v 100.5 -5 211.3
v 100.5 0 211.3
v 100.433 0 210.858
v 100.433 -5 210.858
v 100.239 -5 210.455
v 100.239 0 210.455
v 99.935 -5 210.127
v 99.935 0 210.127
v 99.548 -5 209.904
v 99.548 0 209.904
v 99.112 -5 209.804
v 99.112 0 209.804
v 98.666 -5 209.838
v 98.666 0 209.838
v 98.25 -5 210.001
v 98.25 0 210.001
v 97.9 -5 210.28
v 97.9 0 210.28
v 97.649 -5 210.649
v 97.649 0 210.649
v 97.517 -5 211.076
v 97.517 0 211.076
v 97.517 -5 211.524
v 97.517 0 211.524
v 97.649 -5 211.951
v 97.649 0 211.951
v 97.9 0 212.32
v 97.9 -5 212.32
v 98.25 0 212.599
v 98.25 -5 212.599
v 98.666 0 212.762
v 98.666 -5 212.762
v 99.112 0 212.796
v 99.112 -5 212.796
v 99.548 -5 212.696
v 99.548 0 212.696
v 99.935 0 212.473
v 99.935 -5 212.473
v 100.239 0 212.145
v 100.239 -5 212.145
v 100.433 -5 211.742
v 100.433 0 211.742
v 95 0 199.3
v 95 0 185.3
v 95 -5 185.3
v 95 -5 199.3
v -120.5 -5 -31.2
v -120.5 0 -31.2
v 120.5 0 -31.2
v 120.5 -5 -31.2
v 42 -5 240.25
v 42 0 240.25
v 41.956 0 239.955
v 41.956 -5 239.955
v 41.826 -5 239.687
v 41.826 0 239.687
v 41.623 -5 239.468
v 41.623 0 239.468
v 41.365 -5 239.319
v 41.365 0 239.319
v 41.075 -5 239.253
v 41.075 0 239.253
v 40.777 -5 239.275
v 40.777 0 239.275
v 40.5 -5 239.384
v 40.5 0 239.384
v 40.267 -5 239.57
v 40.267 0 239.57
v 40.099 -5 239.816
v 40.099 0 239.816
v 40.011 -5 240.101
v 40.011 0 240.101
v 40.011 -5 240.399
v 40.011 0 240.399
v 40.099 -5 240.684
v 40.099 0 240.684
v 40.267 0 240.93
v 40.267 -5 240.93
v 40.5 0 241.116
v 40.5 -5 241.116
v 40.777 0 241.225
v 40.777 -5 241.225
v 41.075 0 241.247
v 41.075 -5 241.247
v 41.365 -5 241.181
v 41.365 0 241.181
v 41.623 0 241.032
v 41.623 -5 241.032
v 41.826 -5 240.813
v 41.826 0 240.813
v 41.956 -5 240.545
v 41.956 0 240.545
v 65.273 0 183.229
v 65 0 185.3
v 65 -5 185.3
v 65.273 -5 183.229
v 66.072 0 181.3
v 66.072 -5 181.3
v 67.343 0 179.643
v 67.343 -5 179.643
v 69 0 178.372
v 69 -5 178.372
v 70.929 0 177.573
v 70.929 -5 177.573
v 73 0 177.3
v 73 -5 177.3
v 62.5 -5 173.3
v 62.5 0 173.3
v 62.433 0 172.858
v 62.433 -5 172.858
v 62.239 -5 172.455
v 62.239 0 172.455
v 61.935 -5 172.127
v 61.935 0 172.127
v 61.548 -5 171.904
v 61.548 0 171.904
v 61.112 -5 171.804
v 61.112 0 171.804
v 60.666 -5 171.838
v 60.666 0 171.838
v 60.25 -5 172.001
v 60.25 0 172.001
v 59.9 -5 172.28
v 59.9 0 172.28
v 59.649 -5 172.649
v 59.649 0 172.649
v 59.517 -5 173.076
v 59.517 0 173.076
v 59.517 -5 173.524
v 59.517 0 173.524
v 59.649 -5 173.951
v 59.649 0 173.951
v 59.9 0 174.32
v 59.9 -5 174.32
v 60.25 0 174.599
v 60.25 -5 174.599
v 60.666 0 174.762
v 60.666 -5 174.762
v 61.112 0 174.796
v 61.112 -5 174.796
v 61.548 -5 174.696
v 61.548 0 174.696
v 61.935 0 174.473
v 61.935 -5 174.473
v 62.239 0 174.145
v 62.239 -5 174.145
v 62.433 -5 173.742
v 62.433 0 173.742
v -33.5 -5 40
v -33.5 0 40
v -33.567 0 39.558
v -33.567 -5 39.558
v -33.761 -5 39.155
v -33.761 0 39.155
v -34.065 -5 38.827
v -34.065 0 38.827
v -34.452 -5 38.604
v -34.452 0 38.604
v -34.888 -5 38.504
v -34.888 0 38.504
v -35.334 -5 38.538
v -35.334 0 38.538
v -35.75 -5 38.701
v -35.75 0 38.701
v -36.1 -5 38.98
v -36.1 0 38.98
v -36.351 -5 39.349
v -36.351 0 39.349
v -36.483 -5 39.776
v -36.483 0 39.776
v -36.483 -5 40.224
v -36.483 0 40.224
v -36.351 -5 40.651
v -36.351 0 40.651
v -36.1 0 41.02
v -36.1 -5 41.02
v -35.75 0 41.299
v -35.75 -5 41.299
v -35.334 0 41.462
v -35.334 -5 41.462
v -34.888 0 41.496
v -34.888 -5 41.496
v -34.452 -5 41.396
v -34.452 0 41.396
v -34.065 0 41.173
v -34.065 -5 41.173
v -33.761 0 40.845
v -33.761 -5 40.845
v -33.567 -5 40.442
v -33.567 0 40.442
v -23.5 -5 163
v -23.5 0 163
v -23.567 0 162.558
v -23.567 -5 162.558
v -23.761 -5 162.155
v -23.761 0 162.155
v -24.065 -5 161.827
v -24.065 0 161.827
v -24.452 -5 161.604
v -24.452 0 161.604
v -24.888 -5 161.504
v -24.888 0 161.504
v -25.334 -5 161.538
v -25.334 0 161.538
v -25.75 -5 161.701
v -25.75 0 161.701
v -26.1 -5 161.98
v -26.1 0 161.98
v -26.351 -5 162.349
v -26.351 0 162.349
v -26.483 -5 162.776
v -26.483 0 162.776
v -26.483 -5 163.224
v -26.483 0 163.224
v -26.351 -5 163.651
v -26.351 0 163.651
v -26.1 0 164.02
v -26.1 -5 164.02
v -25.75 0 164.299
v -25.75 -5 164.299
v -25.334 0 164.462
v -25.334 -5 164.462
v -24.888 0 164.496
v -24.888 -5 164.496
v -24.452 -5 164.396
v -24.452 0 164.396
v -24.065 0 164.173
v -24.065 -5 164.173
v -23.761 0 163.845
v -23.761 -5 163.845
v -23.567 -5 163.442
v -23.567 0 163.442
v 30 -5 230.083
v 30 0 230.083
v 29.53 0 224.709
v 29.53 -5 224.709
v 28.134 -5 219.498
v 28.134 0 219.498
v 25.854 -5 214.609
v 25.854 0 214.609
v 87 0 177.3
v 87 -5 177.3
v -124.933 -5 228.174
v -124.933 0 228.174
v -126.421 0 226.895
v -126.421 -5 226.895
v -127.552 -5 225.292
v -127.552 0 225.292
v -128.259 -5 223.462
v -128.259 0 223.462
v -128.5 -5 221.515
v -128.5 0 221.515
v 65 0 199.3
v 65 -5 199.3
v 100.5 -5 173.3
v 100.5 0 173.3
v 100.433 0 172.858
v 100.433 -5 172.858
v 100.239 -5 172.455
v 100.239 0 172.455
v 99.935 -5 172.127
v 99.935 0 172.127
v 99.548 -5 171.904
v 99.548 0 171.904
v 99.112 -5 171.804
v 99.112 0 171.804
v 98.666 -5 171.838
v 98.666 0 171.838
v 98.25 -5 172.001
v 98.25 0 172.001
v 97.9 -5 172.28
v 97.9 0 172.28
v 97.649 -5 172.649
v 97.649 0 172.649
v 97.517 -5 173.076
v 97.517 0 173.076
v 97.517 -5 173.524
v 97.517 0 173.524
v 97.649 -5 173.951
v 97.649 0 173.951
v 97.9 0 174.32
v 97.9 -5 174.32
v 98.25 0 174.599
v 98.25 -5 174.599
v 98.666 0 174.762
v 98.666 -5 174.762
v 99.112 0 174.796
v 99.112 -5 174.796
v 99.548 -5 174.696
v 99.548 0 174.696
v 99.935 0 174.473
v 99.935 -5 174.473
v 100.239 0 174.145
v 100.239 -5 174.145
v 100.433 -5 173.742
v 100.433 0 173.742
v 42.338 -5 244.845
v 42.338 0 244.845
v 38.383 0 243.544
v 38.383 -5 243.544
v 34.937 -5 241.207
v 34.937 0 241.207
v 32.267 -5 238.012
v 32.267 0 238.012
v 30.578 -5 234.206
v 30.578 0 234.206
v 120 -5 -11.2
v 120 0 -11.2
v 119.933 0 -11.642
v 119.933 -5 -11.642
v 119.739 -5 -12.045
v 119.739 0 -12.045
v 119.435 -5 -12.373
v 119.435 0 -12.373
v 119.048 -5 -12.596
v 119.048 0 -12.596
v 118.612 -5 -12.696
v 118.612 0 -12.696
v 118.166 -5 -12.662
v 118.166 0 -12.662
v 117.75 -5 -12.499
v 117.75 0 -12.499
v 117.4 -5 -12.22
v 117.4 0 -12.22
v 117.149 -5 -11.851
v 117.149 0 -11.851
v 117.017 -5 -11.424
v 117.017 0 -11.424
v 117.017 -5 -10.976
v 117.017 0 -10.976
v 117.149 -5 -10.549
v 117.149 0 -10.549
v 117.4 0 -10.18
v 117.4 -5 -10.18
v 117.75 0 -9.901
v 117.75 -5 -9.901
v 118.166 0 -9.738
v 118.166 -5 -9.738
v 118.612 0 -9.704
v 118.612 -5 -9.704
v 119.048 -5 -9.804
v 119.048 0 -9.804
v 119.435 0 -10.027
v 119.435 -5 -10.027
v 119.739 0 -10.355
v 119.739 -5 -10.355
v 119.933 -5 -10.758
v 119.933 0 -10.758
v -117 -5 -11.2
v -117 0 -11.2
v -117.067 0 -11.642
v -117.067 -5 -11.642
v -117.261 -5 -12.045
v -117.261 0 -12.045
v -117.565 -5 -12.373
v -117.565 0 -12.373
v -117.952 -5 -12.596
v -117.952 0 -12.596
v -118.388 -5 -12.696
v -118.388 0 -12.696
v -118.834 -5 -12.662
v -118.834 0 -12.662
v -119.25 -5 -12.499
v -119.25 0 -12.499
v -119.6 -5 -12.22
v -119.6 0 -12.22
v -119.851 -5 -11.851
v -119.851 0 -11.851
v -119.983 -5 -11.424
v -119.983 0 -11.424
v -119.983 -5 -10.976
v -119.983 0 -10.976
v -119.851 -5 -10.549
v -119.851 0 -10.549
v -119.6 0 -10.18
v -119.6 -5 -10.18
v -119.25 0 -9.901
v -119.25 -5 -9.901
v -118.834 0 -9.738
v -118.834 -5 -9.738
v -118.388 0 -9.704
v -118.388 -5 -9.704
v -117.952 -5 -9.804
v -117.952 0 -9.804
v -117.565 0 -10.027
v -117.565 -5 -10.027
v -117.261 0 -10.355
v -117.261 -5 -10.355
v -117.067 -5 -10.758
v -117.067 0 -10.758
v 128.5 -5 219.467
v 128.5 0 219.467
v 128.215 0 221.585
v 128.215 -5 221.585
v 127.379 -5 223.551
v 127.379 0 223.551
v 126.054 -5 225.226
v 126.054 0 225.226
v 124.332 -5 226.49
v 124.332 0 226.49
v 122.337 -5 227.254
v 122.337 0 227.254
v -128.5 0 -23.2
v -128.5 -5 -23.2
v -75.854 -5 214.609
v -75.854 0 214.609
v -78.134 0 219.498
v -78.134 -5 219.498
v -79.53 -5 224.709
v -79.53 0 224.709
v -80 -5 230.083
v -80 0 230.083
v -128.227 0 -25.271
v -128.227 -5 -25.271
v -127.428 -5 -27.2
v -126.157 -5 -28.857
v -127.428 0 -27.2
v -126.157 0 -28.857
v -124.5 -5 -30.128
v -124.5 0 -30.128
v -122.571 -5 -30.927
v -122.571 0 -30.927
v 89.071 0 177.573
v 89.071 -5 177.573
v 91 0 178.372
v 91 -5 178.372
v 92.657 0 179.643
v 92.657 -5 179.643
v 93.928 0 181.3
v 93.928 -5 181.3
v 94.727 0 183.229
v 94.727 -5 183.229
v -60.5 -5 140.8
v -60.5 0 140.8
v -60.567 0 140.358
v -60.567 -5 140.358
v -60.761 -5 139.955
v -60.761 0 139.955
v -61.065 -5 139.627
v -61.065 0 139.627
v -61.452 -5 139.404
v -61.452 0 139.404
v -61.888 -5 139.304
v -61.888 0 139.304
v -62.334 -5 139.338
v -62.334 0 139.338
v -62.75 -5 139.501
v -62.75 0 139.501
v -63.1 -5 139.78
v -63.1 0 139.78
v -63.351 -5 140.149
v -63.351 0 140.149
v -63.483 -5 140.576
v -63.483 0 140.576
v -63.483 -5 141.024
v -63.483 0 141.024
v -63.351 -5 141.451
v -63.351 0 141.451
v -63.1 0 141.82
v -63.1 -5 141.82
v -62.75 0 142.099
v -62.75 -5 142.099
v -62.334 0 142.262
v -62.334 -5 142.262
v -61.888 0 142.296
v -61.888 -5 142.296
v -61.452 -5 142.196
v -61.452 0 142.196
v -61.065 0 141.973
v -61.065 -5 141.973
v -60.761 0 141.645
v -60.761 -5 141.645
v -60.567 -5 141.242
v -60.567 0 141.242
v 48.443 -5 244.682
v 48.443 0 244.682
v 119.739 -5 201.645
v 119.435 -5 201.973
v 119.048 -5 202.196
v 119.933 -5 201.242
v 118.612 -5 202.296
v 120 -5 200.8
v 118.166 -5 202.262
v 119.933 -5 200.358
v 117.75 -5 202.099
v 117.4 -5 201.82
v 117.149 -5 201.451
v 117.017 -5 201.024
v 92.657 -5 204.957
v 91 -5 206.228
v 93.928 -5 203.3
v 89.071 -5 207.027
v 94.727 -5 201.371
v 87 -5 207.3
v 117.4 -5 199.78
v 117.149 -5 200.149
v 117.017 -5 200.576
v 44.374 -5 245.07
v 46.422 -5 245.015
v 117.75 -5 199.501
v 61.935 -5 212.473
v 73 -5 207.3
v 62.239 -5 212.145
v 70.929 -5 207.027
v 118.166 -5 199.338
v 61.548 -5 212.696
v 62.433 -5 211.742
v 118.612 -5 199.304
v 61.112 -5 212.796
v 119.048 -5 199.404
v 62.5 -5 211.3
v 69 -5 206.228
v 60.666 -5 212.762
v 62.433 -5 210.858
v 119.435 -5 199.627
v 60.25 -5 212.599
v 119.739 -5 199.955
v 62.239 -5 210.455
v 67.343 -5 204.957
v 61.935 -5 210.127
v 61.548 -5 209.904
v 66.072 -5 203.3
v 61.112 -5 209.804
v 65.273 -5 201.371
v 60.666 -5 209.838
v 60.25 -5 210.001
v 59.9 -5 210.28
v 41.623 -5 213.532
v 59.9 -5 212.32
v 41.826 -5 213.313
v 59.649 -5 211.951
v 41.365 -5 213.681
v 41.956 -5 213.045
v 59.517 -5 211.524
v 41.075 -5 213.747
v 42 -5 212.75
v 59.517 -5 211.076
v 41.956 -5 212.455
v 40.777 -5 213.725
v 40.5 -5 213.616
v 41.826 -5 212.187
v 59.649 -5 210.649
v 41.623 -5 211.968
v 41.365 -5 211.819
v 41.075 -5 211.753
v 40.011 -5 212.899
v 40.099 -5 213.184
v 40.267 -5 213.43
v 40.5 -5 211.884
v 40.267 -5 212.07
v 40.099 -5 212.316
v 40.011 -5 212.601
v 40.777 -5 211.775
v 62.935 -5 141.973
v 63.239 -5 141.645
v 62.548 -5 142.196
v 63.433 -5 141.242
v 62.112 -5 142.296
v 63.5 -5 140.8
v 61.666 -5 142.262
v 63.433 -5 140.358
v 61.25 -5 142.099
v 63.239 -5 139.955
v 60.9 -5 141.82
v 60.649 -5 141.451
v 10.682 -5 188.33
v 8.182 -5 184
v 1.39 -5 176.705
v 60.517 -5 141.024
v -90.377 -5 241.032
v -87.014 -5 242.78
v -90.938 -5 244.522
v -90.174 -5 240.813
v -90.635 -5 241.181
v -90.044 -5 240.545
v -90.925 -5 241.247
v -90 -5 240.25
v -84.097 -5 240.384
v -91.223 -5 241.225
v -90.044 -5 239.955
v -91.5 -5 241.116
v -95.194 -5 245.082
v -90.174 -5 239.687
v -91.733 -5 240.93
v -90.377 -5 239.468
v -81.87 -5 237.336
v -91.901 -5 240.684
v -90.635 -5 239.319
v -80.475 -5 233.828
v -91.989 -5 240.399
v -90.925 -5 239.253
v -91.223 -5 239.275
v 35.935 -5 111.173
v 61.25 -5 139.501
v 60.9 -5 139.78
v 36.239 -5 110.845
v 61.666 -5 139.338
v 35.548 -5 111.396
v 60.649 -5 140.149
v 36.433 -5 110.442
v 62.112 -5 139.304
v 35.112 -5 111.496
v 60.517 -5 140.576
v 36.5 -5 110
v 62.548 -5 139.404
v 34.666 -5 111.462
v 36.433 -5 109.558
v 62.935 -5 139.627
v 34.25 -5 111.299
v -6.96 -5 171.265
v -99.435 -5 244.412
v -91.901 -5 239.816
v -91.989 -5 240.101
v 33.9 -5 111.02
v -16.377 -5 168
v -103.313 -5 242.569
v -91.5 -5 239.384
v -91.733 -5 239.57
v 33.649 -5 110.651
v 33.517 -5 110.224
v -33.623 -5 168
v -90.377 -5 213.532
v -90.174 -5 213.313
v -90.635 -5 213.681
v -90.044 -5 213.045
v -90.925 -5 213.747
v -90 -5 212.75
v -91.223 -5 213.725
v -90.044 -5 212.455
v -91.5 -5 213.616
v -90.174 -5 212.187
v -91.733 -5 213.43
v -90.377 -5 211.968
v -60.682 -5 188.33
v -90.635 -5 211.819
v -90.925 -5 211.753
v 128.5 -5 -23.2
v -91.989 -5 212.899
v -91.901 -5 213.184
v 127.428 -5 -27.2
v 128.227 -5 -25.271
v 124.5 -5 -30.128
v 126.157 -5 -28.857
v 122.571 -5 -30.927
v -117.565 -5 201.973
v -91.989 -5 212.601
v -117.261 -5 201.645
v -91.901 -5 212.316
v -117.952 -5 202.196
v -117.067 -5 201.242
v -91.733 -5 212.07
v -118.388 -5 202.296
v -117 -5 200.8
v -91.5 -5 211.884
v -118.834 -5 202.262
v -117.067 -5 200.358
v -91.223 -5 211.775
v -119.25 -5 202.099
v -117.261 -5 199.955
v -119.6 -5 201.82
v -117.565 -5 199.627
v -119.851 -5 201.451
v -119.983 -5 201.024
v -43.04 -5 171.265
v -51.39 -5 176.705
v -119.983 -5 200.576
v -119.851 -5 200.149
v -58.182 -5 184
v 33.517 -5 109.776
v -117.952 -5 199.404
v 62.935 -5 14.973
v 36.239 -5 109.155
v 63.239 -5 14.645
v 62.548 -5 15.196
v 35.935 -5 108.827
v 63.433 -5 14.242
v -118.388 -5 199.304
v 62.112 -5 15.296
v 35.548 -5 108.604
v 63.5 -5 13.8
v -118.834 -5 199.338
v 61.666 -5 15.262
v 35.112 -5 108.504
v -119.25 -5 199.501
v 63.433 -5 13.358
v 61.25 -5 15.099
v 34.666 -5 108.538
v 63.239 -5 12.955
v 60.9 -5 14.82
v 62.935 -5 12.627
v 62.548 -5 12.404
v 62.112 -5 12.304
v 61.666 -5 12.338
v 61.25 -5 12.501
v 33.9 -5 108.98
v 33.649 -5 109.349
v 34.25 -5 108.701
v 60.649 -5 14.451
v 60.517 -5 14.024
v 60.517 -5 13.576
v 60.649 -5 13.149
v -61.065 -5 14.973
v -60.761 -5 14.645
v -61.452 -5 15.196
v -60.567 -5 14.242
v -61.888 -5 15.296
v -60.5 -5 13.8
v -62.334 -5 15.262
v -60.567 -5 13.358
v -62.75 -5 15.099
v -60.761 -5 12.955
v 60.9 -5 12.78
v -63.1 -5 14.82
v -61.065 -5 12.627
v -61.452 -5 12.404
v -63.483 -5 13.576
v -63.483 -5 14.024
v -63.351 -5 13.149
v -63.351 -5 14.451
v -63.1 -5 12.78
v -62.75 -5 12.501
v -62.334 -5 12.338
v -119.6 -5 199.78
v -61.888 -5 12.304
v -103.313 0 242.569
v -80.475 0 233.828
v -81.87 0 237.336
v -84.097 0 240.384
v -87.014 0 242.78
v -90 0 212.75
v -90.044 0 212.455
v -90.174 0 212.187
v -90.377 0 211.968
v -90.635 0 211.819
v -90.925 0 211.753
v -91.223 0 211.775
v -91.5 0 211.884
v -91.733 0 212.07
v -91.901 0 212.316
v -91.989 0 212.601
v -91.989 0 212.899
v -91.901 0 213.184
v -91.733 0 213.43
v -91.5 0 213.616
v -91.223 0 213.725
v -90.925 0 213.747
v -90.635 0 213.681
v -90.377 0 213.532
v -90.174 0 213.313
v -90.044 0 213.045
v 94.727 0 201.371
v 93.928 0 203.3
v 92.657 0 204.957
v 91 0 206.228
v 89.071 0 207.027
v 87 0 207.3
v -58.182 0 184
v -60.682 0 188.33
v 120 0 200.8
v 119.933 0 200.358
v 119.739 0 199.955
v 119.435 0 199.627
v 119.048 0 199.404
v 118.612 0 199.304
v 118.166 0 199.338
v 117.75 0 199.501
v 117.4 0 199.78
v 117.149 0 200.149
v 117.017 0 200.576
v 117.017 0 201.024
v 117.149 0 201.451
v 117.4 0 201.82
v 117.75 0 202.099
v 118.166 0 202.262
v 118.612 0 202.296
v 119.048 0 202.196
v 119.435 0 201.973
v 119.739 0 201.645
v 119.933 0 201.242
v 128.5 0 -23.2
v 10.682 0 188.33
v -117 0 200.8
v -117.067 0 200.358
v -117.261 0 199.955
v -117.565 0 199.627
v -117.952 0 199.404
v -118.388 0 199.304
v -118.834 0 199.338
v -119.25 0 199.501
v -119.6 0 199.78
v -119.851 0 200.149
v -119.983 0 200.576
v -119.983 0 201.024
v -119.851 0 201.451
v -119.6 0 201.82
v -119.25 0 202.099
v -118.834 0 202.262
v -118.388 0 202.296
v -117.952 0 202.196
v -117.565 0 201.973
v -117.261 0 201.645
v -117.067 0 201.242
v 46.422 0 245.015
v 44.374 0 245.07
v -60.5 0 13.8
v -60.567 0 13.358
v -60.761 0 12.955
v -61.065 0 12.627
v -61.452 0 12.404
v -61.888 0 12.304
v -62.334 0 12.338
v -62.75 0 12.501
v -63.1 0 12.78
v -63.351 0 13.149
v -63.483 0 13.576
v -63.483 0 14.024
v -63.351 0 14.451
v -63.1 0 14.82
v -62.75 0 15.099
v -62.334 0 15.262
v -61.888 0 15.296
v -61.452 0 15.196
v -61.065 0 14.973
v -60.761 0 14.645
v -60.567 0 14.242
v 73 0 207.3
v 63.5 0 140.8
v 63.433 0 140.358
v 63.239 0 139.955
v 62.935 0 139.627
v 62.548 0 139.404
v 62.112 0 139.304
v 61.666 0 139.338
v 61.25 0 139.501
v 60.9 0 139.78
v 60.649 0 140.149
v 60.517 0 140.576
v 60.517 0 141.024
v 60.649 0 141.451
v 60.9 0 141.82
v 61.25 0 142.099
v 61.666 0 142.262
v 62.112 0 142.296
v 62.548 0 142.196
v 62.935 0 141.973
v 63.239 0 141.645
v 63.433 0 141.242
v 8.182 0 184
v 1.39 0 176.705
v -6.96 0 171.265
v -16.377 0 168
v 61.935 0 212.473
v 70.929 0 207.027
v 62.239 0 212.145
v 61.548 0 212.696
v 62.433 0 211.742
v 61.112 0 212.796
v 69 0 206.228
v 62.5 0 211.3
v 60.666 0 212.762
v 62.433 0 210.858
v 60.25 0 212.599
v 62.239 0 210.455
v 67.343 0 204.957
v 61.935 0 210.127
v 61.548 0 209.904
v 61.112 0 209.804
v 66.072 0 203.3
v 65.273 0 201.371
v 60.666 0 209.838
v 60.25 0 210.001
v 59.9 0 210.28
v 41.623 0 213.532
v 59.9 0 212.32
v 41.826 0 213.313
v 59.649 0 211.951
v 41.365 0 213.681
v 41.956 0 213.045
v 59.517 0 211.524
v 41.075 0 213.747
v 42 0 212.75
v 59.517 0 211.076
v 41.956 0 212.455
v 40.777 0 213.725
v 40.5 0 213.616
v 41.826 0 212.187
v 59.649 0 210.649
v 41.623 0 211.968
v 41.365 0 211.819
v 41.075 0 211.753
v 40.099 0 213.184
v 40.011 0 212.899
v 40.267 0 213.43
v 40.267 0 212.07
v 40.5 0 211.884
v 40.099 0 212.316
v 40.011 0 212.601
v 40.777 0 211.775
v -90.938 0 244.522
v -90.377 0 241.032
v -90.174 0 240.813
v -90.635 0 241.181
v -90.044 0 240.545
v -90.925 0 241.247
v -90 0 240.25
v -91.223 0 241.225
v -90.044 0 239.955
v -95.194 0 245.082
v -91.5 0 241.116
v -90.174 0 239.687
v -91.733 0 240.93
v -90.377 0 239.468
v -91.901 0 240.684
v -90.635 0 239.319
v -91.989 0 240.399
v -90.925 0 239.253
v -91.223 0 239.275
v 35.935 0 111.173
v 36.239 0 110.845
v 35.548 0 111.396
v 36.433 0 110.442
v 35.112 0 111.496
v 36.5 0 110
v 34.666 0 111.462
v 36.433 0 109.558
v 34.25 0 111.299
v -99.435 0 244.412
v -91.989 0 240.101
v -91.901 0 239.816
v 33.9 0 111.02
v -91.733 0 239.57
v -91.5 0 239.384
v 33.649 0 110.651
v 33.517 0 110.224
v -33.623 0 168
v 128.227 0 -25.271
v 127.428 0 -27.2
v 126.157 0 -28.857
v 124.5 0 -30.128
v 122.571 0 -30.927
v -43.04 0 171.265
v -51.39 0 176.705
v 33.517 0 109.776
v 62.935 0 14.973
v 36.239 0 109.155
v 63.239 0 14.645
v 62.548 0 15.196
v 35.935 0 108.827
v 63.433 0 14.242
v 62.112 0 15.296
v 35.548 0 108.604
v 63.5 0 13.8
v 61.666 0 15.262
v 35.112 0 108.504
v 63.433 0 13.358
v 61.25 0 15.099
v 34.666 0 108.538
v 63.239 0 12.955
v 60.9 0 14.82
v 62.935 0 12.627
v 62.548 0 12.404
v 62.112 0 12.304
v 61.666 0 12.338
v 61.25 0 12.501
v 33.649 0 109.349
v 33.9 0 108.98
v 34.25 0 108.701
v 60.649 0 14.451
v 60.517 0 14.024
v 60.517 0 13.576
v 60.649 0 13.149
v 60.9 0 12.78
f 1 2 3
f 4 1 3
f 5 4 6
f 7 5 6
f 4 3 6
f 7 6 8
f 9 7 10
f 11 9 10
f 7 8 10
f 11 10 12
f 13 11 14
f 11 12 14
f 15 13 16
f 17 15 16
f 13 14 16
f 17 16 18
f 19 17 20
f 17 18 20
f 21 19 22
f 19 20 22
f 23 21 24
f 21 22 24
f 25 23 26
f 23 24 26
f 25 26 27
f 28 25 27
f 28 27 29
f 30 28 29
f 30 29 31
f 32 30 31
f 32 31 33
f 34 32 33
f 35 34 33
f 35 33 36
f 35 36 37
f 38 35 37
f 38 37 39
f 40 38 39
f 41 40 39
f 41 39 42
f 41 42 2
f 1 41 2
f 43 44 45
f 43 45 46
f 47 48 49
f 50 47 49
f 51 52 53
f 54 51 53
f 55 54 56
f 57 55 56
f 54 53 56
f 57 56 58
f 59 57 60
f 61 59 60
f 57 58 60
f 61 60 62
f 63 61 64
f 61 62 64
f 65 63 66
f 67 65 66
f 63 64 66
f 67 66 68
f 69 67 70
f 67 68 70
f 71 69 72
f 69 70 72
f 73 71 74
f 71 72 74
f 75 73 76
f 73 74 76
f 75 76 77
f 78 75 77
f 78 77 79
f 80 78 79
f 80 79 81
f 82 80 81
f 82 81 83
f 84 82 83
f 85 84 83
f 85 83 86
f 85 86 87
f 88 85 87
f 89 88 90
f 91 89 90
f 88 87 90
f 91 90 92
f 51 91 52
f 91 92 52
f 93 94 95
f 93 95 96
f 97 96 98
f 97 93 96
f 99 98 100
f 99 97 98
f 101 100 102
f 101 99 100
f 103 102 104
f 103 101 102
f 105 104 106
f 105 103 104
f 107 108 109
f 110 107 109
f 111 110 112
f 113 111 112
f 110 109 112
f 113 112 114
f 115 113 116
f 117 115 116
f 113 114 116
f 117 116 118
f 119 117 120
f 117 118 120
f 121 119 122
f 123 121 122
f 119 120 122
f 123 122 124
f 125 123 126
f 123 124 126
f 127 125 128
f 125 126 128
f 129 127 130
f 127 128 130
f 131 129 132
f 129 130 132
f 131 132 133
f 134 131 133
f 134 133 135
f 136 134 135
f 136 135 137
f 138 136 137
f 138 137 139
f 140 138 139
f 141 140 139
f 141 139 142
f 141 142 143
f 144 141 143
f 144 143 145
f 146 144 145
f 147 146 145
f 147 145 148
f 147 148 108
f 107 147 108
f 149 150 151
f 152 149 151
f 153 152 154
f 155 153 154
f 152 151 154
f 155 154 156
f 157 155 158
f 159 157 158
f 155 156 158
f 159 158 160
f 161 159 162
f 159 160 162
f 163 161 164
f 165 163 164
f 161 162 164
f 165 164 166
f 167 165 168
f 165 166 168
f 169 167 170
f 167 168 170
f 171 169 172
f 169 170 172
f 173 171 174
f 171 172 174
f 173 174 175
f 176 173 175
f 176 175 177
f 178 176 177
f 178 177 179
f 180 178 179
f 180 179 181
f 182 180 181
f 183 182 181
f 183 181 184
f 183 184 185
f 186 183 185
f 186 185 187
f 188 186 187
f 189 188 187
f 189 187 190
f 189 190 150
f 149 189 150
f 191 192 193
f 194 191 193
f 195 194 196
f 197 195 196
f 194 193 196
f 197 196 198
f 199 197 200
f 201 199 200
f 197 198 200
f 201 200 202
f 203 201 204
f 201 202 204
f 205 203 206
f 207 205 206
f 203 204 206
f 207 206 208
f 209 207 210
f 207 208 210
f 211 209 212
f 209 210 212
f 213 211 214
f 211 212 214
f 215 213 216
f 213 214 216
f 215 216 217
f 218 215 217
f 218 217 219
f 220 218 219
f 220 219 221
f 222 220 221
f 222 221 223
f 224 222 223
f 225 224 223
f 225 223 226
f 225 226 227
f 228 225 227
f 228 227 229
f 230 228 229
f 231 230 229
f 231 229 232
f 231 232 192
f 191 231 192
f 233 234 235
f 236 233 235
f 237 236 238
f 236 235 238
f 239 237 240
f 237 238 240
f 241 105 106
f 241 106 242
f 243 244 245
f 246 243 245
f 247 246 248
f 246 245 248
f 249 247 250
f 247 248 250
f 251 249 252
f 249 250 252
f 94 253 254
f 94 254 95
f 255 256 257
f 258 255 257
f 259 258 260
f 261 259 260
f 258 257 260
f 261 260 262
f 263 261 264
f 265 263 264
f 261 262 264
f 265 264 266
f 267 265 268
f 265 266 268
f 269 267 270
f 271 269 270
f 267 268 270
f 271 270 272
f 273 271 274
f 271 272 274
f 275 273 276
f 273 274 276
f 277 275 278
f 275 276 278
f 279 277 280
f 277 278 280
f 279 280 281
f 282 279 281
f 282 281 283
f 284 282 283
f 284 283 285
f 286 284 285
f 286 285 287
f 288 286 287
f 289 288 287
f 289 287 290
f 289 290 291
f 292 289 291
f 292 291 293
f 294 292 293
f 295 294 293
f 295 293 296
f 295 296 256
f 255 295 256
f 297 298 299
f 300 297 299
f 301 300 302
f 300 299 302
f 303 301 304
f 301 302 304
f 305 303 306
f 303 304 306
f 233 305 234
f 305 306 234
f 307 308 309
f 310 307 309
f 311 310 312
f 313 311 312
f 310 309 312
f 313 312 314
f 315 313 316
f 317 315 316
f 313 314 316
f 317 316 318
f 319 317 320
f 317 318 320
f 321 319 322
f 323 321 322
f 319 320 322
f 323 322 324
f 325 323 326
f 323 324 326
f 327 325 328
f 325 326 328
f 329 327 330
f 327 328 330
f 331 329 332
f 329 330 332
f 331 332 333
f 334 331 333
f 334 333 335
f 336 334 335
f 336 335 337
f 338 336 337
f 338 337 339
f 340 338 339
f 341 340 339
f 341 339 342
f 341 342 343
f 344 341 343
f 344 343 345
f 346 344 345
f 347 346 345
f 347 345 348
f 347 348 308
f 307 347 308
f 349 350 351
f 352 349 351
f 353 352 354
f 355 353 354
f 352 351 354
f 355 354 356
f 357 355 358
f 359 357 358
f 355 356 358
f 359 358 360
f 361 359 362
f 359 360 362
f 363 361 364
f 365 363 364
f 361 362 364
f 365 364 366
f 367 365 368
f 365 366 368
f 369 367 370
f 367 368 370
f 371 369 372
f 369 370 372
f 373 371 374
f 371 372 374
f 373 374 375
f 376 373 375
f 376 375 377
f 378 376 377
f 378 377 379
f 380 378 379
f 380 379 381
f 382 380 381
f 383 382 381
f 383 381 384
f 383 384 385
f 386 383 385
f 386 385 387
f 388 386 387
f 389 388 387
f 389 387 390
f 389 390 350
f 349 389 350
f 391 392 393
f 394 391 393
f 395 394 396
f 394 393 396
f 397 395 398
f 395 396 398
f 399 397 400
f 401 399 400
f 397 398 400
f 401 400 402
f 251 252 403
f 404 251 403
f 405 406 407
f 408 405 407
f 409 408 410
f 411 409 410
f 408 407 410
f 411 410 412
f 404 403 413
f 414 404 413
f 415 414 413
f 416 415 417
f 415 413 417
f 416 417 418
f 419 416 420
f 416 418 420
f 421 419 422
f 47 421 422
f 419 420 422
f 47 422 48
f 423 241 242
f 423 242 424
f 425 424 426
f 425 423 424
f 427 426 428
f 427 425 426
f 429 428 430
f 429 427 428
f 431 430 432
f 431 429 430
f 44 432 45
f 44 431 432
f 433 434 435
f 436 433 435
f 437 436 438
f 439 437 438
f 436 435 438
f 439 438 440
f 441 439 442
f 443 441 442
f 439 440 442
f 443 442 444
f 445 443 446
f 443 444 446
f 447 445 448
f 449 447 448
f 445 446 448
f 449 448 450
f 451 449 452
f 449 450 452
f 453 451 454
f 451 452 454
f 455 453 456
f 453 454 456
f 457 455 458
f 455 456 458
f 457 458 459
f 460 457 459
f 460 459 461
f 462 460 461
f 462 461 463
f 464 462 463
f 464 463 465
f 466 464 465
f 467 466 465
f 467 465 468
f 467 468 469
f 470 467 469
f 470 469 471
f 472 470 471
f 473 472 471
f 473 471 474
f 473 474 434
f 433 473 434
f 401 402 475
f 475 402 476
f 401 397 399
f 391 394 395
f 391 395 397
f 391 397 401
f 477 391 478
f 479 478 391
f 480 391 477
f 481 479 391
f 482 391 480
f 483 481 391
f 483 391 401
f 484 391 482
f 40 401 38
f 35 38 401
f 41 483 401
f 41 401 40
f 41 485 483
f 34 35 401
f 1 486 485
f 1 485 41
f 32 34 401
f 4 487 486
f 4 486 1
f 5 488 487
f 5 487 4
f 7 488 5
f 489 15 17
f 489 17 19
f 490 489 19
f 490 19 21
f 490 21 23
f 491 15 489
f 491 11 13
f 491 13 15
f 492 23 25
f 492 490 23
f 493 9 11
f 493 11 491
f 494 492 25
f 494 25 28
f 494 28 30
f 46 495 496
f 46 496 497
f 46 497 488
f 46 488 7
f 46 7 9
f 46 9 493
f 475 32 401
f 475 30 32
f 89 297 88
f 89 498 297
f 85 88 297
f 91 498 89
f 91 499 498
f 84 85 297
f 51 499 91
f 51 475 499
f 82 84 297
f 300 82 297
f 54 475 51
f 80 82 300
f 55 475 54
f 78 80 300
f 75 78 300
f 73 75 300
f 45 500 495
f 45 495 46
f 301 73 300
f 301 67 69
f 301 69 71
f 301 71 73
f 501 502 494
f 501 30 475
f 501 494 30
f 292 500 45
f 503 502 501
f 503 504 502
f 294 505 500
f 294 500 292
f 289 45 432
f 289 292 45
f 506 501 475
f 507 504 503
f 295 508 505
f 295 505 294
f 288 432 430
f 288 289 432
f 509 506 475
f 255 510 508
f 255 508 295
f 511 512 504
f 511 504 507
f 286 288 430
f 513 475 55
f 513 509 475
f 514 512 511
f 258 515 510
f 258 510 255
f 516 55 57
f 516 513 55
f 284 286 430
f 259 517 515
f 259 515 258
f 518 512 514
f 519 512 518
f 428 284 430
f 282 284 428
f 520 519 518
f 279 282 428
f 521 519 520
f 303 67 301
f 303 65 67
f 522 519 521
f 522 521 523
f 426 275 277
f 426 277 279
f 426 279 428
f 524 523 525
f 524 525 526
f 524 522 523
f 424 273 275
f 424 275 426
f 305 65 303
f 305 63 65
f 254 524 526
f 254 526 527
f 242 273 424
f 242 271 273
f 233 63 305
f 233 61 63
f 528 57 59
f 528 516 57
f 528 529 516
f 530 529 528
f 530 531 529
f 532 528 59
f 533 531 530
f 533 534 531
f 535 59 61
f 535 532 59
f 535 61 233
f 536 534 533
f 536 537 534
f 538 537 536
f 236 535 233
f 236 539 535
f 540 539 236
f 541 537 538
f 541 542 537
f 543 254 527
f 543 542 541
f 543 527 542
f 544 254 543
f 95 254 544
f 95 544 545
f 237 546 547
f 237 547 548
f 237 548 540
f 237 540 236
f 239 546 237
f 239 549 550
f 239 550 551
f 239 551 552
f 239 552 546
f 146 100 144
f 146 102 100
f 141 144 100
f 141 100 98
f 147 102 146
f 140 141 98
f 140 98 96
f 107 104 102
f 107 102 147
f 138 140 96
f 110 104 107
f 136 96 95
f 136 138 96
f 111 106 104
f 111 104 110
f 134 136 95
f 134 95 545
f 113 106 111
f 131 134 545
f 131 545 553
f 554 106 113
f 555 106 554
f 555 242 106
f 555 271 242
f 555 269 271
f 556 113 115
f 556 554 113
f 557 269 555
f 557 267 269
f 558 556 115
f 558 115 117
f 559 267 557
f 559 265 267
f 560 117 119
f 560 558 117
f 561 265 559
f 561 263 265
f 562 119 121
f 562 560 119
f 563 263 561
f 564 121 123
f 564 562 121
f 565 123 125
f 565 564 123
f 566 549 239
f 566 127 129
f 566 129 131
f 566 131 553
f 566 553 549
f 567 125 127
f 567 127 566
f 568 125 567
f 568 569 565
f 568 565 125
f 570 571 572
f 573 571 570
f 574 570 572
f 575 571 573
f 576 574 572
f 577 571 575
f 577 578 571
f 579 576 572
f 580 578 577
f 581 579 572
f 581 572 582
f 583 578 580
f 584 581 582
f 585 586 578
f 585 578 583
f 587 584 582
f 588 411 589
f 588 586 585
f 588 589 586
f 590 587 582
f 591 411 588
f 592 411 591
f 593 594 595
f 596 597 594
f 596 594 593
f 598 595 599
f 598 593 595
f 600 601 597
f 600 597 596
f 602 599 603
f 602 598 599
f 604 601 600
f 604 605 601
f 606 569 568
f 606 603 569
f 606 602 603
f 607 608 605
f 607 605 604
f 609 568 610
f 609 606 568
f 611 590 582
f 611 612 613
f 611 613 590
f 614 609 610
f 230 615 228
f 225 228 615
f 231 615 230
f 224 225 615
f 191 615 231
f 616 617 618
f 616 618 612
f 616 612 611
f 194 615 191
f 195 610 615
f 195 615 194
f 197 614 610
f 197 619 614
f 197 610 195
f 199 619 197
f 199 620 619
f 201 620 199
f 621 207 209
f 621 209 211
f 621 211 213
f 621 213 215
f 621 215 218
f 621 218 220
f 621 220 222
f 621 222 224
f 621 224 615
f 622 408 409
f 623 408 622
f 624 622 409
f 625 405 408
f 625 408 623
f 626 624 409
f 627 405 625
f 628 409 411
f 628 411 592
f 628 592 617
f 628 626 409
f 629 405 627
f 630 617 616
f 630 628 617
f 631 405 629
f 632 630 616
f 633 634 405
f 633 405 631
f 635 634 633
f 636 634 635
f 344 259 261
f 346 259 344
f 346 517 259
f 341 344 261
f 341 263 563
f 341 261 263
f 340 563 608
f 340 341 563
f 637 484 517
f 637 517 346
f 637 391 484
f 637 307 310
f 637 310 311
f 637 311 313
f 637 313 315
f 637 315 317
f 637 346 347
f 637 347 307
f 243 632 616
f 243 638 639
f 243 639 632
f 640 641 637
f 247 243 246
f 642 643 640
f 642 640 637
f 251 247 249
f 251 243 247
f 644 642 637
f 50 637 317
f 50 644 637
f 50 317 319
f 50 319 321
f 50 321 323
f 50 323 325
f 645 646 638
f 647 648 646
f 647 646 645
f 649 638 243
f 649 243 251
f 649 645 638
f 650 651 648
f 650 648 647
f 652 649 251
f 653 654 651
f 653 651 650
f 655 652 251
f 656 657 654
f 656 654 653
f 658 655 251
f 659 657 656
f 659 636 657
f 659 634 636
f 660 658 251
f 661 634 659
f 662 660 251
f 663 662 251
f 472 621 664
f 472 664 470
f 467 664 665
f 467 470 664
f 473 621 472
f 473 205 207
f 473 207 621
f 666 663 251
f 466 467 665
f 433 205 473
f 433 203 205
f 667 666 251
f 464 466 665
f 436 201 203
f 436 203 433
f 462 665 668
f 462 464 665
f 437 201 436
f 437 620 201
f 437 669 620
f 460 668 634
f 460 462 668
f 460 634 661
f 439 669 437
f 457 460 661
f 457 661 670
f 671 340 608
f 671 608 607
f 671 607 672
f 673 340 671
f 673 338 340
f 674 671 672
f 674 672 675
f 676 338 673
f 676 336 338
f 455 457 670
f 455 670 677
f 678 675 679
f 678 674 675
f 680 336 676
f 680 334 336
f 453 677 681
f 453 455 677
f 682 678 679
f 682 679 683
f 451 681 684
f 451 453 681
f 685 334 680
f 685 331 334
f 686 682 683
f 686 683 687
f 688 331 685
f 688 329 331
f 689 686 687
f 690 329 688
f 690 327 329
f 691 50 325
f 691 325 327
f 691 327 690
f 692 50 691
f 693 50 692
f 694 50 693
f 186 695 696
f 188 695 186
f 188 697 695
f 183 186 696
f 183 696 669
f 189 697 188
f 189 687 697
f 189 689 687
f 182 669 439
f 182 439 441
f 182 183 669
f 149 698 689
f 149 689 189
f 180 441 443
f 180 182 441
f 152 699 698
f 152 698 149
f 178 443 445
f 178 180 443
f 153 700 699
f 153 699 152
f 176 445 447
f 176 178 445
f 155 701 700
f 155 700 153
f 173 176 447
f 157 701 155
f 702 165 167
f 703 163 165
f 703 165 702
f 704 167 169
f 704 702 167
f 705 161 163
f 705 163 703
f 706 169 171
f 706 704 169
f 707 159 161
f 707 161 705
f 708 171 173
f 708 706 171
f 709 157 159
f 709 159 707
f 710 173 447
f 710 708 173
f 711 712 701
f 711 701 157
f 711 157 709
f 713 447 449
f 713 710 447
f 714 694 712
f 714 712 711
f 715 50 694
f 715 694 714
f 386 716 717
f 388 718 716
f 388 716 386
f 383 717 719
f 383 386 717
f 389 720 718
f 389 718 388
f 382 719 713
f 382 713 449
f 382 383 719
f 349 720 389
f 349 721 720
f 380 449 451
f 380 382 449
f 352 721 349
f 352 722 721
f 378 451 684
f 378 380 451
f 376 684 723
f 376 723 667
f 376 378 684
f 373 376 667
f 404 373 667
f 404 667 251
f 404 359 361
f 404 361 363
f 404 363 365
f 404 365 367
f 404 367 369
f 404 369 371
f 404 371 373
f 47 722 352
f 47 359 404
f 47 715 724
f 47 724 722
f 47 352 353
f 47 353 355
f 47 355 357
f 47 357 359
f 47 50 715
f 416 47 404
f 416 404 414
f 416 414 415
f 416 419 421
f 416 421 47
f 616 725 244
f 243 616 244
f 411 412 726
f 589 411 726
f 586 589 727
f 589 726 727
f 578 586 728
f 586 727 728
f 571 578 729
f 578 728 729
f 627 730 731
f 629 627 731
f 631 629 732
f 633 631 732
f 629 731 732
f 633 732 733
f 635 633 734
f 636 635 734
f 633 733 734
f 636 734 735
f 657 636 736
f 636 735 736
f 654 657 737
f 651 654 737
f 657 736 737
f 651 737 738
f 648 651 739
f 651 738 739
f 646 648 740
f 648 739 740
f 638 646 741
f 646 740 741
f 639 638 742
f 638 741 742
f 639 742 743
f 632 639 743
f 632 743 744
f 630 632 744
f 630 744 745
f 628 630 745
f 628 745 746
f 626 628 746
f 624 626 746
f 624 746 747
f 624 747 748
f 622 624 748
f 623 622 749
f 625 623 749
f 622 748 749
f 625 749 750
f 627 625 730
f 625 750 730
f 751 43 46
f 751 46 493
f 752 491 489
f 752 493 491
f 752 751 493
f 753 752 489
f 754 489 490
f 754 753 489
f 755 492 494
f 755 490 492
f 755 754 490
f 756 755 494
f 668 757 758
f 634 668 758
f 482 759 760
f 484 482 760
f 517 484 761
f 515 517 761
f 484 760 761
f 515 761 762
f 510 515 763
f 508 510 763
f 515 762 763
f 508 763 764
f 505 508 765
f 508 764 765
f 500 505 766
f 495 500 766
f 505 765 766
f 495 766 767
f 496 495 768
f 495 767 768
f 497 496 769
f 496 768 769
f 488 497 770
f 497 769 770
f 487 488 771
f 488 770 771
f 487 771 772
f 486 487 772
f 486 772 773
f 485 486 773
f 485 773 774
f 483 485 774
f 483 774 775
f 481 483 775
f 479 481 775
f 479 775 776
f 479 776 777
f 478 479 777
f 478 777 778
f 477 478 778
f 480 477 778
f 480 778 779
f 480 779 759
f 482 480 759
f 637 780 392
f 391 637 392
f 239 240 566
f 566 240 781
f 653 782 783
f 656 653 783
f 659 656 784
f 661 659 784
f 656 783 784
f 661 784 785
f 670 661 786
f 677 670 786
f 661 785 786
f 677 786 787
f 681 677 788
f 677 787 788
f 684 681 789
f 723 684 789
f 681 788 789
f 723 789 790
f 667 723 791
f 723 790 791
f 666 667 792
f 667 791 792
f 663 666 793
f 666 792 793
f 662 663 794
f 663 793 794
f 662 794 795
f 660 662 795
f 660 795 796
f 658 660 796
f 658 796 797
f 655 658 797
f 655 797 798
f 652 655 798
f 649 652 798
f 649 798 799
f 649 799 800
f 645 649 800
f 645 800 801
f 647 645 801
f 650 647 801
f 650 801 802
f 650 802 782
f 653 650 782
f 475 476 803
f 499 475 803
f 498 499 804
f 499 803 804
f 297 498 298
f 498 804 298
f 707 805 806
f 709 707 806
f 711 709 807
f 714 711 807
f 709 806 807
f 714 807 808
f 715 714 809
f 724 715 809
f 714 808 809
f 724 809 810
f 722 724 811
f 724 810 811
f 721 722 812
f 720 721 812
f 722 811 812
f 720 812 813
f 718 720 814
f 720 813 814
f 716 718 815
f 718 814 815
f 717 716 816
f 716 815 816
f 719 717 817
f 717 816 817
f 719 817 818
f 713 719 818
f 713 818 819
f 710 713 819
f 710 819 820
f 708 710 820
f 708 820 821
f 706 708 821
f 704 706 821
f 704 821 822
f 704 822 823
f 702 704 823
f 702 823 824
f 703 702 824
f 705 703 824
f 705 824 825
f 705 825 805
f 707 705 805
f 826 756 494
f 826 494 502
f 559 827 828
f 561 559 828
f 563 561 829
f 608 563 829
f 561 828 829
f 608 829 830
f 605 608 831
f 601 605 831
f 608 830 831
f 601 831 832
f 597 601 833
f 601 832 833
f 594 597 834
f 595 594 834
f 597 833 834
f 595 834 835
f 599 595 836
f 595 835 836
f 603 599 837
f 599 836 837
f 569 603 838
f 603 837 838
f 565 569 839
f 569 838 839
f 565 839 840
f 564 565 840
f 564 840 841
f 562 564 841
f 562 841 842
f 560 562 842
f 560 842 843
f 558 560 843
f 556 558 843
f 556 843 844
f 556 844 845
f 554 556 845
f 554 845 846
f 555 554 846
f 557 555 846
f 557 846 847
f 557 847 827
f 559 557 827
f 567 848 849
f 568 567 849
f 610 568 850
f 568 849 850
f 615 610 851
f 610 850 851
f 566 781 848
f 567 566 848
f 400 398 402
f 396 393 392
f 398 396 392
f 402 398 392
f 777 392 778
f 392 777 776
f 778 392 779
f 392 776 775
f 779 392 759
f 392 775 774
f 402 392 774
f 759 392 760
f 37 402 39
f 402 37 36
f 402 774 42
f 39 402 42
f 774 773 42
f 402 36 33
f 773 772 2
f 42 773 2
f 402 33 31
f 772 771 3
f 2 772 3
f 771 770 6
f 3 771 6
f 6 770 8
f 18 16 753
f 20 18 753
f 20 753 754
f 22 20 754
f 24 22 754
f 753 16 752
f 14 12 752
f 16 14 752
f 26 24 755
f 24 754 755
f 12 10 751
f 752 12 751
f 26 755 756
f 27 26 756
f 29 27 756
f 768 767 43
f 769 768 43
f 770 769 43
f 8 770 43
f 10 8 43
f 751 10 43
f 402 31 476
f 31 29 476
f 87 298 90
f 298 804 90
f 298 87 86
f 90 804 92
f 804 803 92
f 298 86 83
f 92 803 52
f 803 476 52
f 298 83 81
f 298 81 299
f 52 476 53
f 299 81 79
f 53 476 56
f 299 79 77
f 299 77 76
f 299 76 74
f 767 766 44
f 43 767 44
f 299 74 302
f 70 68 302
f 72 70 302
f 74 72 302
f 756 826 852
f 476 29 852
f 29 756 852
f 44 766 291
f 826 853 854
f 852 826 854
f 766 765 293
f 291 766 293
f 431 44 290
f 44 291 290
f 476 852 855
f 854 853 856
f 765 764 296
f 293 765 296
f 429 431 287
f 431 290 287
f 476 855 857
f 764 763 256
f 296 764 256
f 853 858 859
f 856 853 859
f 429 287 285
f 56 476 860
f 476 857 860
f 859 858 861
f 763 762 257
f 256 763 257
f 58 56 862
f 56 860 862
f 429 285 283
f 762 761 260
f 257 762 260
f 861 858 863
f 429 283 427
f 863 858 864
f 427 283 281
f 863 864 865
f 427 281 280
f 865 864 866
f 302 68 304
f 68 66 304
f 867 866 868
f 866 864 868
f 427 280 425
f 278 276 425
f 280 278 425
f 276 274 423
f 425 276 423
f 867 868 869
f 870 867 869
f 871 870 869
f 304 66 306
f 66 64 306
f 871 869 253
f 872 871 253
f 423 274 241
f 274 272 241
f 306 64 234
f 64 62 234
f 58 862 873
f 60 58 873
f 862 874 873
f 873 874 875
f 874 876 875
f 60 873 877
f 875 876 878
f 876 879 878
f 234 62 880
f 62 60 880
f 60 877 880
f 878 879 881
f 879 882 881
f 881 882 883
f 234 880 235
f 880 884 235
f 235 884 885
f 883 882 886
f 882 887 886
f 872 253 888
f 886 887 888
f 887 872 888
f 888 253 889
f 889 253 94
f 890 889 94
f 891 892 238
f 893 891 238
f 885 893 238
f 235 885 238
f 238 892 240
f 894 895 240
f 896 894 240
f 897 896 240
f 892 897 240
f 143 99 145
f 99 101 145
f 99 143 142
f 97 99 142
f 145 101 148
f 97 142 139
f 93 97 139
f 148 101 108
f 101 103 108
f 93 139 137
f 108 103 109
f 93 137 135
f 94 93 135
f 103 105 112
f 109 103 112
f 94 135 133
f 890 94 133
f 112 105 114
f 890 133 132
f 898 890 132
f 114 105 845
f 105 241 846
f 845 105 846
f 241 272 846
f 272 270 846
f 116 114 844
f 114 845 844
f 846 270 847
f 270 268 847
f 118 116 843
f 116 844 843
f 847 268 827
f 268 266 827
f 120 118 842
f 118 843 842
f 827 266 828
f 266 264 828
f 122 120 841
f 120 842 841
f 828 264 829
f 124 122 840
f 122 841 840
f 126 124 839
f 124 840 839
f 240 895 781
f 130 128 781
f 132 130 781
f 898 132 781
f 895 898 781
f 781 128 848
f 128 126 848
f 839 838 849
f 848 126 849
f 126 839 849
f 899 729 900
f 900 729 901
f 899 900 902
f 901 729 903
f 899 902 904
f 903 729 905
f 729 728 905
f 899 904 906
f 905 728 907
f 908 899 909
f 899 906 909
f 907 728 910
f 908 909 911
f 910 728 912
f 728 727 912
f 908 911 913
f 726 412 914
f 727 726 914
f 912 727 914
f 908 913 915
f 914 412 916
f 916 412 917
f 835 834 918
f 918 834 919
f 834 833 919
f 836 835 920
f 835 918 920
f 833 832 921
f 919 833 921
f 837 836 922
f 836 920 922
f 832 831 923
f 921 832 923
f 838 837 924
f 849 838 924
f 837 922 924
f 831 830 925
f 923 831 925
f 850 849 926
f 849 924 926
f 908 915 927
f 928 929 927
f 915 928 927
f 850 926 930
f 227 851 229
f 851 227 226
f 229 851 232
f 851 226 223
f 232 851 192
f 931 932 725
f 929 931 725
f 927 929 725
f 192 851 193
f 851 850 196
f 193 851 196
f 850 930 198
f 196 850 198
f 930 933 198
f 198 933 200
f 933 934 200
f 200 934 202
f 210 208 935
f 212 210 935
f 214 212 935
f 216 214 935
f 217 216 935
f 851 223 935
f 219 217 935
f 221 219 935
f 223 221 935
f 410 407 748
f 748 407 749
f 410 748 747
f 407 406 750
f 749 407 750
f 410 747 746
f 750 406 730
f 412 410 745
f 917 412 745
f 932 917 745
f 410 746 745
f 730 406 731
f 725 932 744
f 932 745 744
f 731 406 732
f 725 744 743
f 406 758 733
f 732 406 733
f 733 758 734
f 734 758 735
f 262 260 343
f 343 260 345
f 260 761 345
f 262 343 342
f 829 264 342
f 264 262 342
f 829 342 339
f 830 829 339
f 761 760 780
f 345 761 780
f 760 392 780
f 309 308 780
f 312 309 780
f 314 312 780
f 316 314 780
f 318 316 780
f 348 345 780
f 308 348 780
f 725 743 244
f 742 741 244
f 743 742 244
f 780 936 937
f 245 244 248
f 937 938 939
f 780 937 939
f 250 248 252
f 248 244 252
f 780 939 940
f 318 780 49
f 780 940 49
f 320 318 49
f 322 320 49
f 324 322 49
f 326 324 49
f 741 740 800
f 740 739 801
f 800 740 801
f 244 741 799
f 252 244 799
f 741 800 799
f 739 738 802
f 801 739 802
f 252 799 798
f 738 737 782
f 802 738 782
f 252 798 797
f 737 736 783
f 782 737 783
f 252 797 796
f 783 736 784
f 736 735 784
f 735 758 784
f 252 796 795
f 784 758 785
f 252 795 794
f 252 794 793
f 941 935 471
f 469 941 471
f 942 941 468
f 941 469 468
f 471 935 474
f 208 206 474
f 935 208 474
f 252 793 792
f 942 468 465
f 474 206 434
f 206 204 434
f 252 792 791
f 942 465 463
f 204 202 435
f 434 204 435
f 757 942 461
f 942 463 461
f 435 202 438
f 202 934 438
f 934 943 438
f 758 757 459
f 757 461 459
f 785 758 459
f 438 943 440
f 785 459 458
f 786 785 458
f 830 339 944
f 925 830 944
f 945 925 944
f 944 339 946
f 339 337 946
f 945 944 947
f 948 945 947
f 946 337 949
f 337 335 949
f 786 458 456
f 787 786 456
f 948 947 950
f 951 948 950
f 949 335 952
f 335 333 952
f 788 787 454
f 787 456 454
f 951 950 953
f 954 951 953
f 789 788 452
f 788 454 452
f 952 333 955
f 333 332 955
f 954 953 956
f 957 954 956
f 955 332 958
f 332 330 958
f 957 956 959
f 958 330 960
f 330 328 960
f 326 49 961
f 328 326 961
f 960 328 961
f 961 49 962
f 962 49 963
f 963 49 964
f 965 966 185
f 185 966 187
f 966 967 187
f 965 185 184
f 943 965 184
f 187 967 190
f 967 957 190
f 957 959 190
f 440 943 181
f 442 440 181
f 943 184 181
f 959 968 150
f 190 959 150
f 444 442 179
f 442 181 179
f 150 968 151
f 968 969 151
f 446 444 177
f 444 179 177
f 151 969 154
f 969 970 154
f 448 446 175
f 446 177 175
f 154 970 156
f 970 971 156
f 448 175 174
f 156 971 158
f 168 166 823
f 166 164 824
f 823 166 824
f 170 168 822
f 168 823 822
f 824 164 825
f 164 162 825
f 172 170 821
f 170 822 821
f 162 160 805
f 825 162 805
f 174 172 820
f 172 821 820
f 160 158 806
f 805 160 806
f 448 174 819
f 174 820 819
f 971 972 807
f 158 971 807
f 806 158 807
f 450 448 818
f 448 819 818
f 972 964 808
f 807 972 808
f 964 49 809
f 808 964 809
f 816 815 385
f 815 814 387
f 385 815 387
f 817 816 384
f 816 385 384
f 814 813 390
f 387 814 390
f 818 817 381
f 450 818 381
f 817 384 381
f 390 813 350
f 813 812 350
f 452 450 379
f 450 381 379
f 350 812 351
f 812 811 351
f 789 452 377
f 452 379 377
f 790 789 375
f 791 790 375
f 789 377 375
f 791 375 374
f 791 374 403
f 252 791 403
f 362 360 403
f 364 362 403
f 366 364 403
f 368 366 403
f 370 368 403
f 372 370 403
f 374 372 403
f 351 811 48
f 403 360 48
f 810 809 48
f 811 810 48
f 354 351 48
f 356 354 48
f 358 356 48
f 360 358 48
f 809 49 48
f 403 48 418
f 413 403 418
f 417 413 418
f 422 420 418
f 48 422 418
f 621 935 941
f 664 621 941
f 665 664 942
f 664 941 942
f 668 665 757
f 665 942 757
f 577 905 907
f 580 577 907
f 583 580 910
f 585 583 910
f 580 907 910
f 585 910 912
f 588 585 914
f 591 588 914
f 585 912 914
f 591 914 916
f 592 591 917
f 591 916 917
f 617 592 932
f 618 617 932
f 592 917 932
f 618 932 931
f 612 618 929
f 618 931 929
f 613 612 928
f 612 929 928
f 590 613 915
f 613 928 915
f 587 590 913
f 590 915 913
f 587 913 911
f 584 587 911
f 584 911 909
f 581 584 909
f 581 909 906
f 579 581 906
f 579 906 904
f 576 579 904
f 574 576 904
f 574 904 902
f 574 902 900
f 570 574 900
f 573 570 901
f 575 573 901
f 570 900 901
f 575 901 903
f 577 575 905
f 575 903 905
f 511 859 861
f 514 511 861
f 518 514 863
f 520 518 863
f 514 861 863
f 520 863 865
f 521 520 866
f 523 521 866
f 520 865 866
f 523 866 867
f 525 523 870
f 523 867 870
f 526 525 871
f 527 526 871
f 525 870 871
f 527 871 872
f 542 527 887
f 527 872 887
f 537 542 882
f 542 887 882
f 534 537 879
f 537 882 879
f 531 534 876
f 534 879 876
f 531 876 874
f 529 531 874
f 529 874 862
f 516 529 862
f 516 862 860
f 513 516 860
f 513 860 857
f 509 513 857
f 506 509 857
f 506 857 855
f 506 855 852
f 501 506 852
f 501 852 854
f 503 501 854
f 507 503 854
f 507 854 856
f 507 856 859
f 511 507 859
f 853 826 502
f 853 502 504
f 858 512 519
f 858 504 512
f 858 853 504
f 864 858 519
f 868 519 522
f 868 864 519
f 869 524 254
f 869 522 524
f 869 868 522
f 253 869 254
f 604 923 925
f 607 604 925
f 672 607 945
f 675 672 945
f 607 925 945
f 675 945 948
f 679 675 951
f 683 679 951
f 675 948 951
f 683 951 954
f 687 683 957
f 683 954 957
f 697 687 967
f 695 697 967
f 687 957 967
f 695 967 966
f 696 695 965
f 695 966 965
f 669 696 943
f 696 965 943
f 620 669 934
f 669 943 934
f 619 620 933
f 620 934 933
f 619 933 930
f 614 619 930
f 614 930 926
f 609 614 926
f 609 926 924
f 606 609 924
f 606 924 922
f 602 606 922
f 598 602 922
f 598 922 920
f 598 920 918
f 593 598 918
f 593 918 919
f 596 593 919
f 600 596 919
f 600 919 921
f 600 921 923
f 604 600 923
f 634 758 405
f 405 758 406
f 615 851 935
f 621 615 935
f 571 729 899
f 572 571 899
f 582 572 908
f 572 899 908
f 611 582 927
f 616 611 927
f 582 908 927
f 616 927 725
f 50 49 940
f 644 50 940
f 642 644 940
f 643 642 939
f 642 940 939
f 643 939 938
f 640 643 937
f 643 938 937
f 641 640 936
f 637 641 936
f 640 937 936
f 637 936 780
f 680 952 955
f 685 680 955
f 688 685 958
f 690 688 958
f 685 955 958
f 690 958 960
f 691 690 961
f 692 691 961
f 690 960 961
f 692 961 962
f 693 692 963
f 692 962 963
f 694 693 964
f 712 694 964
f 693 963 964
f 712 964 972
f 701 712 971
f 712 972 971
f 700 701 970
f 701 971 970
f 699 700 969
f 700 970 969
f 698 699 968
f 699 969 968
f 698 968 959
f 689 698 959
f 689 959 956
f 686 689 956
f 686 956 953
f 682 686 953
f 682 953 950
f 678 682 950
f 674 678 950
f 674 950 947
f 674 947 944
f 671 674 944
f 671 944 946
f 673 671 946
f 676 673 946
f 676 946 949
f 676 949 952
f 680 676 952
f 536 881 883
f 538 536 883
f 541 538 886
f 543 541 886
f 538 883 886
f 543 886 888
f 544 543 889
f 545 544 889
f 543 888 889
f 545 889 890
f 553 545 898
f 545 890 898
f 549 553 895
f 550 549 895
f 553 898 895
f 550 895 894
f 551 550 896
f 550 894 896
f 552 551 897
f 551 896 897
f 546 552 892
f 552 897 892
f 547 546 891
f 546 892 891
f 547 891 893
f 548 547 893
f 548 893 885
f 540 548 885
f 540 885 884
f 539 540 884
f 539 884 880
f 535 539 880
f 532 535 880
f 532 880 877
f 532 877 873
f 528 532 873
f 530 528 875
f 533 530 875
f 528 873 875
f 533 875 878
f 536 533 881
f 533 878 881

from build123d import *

# Parameters (mm, degrees)
ESQUISSE1_R             = 1
BOSS_EXTRU_1_DEPTH      = 5
ESQUISSE2_R             = 1.5
ENL_V_MAT_EXTRU_1_DEPTH = 6
ESQUISSE3_R             = 1.5
ENL_V_MAT_EXTRU_2_DEPTH = 6
ESQUISSE4_R             = 1.5
ENL_V_MAT_EXTRU_3_DEPTH = 6
ESQUISSE5_R             = 1.5
ENL_V_MAT_EXTRU_5_DEPTH = 6


with BuildPart() as part:
    # Esquisse1 → Boss.-Extru.1 (new body)
    with BuildSketch(Plane(origin=(0, 0, 0), x_dir=(1, 0, 0), z_dir=(0, 1, 0))):
        with BuildLine():
            Line((-120.5, 31.2), (120.5, 31.2))
            ThreePointArc((120.5, 31.2), (126.156854249, 28.856854249), (128.5, 23.2))
            Line((128.5, 23.2), (128.5, -219.467382599))
            ThreePointArc((128.5, -219.467382599), (126.772639772, -224.43266107), (122.336502426, -227.253733403))
            Line((122.336502426, -227.253733403), (48.443442049, -244.68228088))
            ThreePointArc((48.443442049, -244.68228088), (45.399263454, -245.077558471), (42.33836323, -244.8448408))
            ThreePointArc((42.33836323, -244.8448408), (33.490774319, -239.702526143), (30, -230.082873123))
            ThreePointArc((30, -230.082873123), (28.945508514, -222.073215083), (25.853895909, -214.609402001))
            Line((25.853895909, -214.609402001), (10.681549424, -188.330127019))
            Line((10.681549424, -188.330127019), (8.181549424, -184))
            ThreePointArc((8.181549424, -184), (-2.618897308, -173.730489766), (-16.376585234, -168))
            Line((-16.376585234, -168), (-33.623414766, -168))
            ThreePointArc((-33.623414766, -168), (-47.381102692, -173.730489766), (-58.181549424, -184))
            Line((-58.181549424, -184), (-60.681549424, -188.330127019))
            Line((-60.681549424, -188.330127019), (-75.853895909, -214.609402001))
            ThreePointArc((-75.853895909, -214.609402001), (-78.945508514, -222.073215083), (-80, -230.082873123))
            ThreePointArc((-80, -230.082873123), (-81.87001368, -237.335697347), (-87.013794564, -242.780137503))
            ThreePointArc((-87.013794564, -242.780137503), (-95.194460163, -245.081612578), (-103.312708305, -242.568820449))
            Line((-103.312708305, -242.568820449), (-124.933444429, -228.174488322))
            ThreePointArc((-124.933444429, -228.174488322), (-127.552217929, -225.292381715), (-128.5, -221.515316414))
            Line((-128.5, -221.515316414), (-128.5, 23.2))
            ThreePointArc((-128.5, 23.2), (-126.156854249, 28.856854249), (-120.5, 31.2))
        make_face()
        with Locations((41, -212.75)):
            Circle(ESQUISSE1_R, mode=Mode.SUBTRACT)
        with Locations((41, -240.25)):
            Circle(ESQUISSE1_R, mode=Mode.SUBTRACT)
        with Locations((-91, -212.75)):
            Circle(ESQUISSE1_R, mode=Mode.SUBTRACT)
        with Locations((-91, -240.25)):
            Circle(ESQUISSE1_R, mode=Mode.SUBTRACT)
    extrude(amount=-BOSS_EXTRU_1_DEPTH)

    # Esquisse2 → Enlèv. mat.-Extru.1 (cut, through all)
    with BuildSketch(Plane(origin=(0, 0, 0), x_dir=(1, 0, 0), z_dir=(0, 1, 0))):
        with Locations((-118.5, 11.2)):
            Circle(ESQUISSE2_R)
        with Locations((-25, -163)):
            Circle(ESQUISSE2_R)
        with Locations((118.5, 11.2)):
            Circle(ESQUISSE2_R)
        with Locations((118.5, -200.8)):
            Circle(ESQUISSE2_R)
        with Locations((-118.5, -200.8)):
            Circle(ESQUISSE2_R)
    extrude(amount=-ENL_V_MAT_EXTRU_1_DEPTH, mode=Mode.SUBTRACT)

    # Esquisse3 → Enlèv. mat.-Extru.2 (cut, through all)
    with BuildSketch(Plane(origin=(0, 0, 0), x_dir=(1, 0, 0), z_dir=(0, 1, 0))):
        with Locations((62, -140.8)):
            Circle(ESQUISSE3_R)
        with Locations((-62, -140.8)):
            Circle(ESQUISSE3_R)
        with Locations((62, -13.8)):
            Circle(ESQUISSE3_R)
        with Locations((-62, -13.8)):
            Circle(ESQUISSE3_R)
    extrude(amount=-ENL_V_MAT_EXTRU_2_DEPTH, mode=Mode.SUBTRACT)

    # Esquisse4 → Enlèv. mat.-Extru.3 (cut, through all)
    with BuildSketch(Plane(origin=(0, 0, 0), x_dir=(1, 0, 0), z_dir=(0, 1, 0))):
        with Locations((-35, -40)):
            Circle(ESQUISSE4_R)
        with Locations((35, -110)):
            Circle(ESQUISSE4_R)
    extrude(amount=-ENL_V_MAT_EXTRU_3_DEPTH, mode=Mode.SUBTRACT)

    # Esquisse5 → Enlèv. mat.-Extru.5 (cut, through all)
    with BuildSketch(Plane(origin=(0, 0, 0), x_dir=(1, 0, 0), z_dir=(0, 1, 0))):
        with Locations((61, -211.3)):
            Circle(ESQUISSE5_R)
        with Locations((99, -211.3)):
            Circle(ESQUISSE5_R)
        with Locations((99, -173.3)):
            Circle(ESQUISSE5_R)
        with Locations((61, -173.3)):
            Circle(ESQUISSE5_R)
        with BuildLine():
            Line((73, -177.3), (87, -177.3))
            ThreePointArc((87, -177.3), (92.656854249, -179.643145751), (95, -185.3))
            Line((95, -185.3), (95, -199.3))
            ThreePointArc((95, -199.3), (92.656854249, -204.956854249), (87, -207.3))
            Line((87, -207.3), (73, -207.3))
            ThreePointArc((73, -207.3), (67.343145751, -204.956854249), (65, -199.3))
            Line((65, -199.3), (65, -185.3))
            ThreePointArc((65, -185.3), (67.343145751, -179.643145751), (73, -177.3))
        make_face()
    extrude(amount=-ENL_V_MAT_EXTRU_5_DEPTH, mode=Mode.SUBTRACT)


solid = part.part
